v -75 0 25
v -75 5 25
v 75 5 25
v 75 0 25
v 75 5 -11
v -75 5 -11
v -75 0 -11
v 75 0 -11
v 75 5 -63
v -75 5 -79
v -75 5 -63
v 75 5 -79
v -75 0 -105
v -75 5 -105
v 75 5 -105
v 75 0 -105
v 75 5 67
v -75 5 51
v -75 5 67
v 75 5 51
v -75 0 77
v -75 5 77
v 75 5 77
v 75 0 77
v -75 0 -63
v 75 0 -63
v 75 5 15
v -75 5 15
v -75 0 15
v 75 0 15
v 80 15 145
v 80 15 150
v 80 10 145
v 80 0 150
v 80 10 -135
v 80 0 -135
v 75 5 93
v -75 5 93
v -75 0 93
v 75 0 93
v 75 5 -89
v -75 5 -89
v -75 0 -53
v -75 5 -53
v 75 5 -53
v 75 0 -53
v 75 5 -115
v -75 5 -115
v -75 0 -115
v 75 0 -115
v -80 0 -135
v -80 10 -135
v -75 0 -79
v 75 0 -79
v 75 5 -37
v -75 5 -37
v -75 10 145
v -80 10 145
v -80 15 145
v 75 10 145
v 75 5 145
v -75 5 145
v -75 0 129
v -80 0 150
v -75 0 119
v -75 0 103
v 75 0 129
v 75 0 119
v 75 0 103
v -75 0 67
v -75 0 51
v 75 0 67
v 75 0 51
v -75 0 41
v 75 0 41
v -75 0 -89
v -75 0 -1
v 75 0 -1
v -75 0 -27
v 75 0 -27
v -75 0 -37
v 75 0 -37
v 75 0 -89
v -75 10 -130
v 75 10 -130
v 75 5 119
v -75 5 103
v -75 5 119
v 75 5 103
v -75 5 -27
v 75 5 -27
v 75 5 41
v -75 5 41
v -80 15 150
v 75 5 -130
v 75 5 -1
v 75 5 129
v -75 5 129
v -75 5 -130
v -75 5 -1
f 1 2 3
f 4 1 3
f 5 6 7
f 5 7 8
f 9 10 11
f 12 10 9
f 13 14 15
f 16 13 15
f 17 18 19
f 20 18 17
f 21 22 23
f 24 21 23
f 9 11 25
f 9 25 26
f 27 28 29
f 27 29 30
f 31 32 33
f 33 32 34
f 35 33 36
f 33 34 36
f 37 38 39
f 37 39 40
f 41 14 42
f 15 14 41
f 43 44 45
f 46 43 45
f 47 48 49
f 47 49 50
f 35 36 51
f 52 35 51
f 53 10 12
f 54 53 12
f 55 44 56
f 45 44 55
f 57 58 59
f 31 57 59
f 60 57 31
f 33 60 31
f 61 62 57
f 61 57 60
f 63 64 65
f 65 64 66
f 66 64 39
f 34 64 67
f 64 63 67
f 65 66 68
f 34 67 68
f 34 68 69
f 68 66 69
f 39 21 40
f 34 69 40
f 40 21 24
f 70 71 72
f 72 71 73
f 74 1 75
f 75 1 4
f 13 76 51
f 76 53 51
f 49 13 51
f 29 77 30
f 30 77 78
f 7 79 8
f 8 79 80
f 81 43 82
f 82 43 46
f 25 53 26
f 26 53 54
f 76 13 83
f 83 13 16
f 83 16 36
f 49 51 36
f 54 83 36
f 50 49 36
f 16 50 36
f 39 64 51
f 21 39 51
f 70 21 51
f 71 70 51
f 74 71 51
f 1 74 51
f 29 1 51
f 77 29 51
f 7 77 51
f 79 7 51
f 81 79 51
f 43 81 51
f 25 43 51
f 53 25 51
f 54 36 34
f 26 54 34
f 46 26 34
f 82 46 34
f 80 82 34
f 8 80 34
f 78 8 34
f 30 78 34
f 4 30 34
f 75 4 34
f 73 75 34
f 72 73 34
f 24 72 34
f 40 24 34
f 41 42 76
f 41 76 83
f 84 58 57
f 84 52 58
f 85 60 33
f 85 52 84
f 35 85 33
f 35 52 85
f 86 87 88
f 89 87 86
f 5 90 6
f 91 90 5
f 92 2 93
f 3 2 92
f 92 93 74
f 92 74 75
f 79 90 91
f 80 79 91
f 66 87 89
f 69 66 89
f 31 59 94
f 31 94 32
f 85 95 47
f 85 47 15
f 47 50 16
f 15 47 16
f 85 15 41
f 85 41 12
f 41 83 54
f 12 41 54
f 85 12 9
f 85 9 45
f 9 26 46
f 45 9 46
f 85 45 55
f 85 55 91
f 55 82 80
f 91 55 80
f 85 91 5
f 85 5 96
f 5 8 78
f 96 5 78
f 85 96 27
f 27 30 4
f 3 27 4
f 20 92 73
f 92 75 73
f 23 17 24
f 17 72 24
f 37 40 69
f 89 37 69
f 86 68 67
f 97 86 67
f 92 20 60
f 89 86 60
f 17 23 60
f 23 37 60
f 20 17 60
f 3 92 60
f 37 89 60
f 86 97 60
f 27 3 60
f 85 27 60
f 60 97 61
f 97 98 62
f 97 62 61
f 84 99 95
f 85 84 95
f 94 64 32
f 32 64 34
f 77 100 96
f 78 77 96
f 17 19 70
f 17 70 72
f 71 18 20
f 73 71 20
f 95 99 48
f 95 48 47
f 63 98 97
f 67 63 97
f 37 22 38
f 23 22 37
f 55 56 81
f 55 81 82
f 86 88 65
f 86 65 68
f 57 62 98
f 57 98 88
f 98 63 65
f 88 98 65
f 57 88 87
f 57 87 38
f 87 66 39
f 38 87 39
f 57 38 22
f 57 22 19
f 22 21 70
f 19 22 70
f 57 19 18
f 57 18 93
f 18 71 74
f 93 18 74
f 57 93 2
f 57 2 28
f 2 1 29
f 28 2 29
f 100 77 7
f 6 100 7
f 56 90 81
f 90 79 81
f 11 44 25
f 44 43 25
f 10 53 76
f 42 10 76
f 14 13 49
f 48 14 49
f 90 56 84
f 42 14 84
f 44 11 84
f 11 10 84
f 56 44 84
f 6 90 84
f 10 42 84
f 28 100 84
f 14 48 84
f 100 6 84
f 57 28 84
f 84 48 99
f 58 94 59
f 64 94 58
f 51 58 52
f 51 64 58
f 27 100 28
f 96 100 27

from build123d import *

# Parameters (mm, degrees)
TRAY_W              = 160
TRAY_H              = 285
BOSS_EXTRUDE1_DEPTH = 5
BOSS_EXTRUDE2_DEPTH = 5
SKETCH3_W           = 160
SKETCH3_H           = 5
BOSS_EXTRUDE3_DEPTH = 10
SKETCH4_W           = 150
SKETCH4_H           = 10
CUT_EXTRUDE1_DEPTH  = 171.293863659


with BuildPart() as part:
    # Tray → Boss-Extrude1 (new body)
    with BuildSketch(Plane(origin=(0, 0, 0), x_dir=(1, 0, 0), z_dir=(0, 1, 0))):
        with Locations((0, -7.5)):
            Rectangle(TRAY_W, TRAY_H)
    extrude(amount=BOSS_EXTRUDE1_DEPTH)

    # tray frame → Boss-Extrude2 (add)
    with BuildSketch(Plane(origin=(0, 5, 0), x_dir=(1, 0, 0), z_dir=(0, 1, 0))):
        Polygon((-80, -145), (-75, -145), (-75, 130), (75, 130), (75, -145), (80, -145), (80, 135), (-80, 135), align=None)
    extrude(amount=BOSS_EXTRUDE2_DEPTH)

    # Sketch3 → Boss-Extrude3 (add)
    with BuildSketch(Plane(origin=(0, 5, 0), x_dir=(1, 0, 0), z_dir=(0, 1, 0))):
        with Locations((0, -147.5)):
            Rectangle(SKETCH3_W, SKETCH3_H)
    extrude(amount=BOSS_EXTRUDE3_DEPTH)

    # Sketch4 → Cut-Extrude1 (cut, through all)
    with BuildSketch(Plane(origin=(0, 5, 0), x_dir=(1, 0, 0), z_dir=(0, 1, 0))):
        with Locations((0, 110)):
            Rectangle(SKETCH4_W, SKETCH4_H)
        with Locations((0, 84)):
            Rectangle(SKETCH4_W, SKETCH4_H)
        with Locations((0, 32)):
            Rectangle(SKETCH4_W, SKETCH4_H)
        with Locations((0, 6)):
            Rectangle(SKETCH4_W, SKETCH4_H)
        with Locations((0, -20)):
            Rectangle(SKETCH4_W, SKETCH4_H)
        with Locations((0, -46)):
            Rectangle(SKETCH4_W, SKETCH4_H)
        with Locations((0, -72)):
            Rectangle(SKETCH4_W, SKETCH4_H)
        with Locations((0, -98)):
            Rectangle(SKETCH4_W, SKETCH4_H)
        with Locations((0, -124)):
            Rectangle(SKETCH4_W, SKETCH4_H)
        with Locations((0, 58)):
            Rectangle(SKETCH4_W, SKETCH4_H)
    extrude(amount=-CUT_EXTRUDE1_DEPTH, mode=Mode.SUBTRACT)


solid = part.part
